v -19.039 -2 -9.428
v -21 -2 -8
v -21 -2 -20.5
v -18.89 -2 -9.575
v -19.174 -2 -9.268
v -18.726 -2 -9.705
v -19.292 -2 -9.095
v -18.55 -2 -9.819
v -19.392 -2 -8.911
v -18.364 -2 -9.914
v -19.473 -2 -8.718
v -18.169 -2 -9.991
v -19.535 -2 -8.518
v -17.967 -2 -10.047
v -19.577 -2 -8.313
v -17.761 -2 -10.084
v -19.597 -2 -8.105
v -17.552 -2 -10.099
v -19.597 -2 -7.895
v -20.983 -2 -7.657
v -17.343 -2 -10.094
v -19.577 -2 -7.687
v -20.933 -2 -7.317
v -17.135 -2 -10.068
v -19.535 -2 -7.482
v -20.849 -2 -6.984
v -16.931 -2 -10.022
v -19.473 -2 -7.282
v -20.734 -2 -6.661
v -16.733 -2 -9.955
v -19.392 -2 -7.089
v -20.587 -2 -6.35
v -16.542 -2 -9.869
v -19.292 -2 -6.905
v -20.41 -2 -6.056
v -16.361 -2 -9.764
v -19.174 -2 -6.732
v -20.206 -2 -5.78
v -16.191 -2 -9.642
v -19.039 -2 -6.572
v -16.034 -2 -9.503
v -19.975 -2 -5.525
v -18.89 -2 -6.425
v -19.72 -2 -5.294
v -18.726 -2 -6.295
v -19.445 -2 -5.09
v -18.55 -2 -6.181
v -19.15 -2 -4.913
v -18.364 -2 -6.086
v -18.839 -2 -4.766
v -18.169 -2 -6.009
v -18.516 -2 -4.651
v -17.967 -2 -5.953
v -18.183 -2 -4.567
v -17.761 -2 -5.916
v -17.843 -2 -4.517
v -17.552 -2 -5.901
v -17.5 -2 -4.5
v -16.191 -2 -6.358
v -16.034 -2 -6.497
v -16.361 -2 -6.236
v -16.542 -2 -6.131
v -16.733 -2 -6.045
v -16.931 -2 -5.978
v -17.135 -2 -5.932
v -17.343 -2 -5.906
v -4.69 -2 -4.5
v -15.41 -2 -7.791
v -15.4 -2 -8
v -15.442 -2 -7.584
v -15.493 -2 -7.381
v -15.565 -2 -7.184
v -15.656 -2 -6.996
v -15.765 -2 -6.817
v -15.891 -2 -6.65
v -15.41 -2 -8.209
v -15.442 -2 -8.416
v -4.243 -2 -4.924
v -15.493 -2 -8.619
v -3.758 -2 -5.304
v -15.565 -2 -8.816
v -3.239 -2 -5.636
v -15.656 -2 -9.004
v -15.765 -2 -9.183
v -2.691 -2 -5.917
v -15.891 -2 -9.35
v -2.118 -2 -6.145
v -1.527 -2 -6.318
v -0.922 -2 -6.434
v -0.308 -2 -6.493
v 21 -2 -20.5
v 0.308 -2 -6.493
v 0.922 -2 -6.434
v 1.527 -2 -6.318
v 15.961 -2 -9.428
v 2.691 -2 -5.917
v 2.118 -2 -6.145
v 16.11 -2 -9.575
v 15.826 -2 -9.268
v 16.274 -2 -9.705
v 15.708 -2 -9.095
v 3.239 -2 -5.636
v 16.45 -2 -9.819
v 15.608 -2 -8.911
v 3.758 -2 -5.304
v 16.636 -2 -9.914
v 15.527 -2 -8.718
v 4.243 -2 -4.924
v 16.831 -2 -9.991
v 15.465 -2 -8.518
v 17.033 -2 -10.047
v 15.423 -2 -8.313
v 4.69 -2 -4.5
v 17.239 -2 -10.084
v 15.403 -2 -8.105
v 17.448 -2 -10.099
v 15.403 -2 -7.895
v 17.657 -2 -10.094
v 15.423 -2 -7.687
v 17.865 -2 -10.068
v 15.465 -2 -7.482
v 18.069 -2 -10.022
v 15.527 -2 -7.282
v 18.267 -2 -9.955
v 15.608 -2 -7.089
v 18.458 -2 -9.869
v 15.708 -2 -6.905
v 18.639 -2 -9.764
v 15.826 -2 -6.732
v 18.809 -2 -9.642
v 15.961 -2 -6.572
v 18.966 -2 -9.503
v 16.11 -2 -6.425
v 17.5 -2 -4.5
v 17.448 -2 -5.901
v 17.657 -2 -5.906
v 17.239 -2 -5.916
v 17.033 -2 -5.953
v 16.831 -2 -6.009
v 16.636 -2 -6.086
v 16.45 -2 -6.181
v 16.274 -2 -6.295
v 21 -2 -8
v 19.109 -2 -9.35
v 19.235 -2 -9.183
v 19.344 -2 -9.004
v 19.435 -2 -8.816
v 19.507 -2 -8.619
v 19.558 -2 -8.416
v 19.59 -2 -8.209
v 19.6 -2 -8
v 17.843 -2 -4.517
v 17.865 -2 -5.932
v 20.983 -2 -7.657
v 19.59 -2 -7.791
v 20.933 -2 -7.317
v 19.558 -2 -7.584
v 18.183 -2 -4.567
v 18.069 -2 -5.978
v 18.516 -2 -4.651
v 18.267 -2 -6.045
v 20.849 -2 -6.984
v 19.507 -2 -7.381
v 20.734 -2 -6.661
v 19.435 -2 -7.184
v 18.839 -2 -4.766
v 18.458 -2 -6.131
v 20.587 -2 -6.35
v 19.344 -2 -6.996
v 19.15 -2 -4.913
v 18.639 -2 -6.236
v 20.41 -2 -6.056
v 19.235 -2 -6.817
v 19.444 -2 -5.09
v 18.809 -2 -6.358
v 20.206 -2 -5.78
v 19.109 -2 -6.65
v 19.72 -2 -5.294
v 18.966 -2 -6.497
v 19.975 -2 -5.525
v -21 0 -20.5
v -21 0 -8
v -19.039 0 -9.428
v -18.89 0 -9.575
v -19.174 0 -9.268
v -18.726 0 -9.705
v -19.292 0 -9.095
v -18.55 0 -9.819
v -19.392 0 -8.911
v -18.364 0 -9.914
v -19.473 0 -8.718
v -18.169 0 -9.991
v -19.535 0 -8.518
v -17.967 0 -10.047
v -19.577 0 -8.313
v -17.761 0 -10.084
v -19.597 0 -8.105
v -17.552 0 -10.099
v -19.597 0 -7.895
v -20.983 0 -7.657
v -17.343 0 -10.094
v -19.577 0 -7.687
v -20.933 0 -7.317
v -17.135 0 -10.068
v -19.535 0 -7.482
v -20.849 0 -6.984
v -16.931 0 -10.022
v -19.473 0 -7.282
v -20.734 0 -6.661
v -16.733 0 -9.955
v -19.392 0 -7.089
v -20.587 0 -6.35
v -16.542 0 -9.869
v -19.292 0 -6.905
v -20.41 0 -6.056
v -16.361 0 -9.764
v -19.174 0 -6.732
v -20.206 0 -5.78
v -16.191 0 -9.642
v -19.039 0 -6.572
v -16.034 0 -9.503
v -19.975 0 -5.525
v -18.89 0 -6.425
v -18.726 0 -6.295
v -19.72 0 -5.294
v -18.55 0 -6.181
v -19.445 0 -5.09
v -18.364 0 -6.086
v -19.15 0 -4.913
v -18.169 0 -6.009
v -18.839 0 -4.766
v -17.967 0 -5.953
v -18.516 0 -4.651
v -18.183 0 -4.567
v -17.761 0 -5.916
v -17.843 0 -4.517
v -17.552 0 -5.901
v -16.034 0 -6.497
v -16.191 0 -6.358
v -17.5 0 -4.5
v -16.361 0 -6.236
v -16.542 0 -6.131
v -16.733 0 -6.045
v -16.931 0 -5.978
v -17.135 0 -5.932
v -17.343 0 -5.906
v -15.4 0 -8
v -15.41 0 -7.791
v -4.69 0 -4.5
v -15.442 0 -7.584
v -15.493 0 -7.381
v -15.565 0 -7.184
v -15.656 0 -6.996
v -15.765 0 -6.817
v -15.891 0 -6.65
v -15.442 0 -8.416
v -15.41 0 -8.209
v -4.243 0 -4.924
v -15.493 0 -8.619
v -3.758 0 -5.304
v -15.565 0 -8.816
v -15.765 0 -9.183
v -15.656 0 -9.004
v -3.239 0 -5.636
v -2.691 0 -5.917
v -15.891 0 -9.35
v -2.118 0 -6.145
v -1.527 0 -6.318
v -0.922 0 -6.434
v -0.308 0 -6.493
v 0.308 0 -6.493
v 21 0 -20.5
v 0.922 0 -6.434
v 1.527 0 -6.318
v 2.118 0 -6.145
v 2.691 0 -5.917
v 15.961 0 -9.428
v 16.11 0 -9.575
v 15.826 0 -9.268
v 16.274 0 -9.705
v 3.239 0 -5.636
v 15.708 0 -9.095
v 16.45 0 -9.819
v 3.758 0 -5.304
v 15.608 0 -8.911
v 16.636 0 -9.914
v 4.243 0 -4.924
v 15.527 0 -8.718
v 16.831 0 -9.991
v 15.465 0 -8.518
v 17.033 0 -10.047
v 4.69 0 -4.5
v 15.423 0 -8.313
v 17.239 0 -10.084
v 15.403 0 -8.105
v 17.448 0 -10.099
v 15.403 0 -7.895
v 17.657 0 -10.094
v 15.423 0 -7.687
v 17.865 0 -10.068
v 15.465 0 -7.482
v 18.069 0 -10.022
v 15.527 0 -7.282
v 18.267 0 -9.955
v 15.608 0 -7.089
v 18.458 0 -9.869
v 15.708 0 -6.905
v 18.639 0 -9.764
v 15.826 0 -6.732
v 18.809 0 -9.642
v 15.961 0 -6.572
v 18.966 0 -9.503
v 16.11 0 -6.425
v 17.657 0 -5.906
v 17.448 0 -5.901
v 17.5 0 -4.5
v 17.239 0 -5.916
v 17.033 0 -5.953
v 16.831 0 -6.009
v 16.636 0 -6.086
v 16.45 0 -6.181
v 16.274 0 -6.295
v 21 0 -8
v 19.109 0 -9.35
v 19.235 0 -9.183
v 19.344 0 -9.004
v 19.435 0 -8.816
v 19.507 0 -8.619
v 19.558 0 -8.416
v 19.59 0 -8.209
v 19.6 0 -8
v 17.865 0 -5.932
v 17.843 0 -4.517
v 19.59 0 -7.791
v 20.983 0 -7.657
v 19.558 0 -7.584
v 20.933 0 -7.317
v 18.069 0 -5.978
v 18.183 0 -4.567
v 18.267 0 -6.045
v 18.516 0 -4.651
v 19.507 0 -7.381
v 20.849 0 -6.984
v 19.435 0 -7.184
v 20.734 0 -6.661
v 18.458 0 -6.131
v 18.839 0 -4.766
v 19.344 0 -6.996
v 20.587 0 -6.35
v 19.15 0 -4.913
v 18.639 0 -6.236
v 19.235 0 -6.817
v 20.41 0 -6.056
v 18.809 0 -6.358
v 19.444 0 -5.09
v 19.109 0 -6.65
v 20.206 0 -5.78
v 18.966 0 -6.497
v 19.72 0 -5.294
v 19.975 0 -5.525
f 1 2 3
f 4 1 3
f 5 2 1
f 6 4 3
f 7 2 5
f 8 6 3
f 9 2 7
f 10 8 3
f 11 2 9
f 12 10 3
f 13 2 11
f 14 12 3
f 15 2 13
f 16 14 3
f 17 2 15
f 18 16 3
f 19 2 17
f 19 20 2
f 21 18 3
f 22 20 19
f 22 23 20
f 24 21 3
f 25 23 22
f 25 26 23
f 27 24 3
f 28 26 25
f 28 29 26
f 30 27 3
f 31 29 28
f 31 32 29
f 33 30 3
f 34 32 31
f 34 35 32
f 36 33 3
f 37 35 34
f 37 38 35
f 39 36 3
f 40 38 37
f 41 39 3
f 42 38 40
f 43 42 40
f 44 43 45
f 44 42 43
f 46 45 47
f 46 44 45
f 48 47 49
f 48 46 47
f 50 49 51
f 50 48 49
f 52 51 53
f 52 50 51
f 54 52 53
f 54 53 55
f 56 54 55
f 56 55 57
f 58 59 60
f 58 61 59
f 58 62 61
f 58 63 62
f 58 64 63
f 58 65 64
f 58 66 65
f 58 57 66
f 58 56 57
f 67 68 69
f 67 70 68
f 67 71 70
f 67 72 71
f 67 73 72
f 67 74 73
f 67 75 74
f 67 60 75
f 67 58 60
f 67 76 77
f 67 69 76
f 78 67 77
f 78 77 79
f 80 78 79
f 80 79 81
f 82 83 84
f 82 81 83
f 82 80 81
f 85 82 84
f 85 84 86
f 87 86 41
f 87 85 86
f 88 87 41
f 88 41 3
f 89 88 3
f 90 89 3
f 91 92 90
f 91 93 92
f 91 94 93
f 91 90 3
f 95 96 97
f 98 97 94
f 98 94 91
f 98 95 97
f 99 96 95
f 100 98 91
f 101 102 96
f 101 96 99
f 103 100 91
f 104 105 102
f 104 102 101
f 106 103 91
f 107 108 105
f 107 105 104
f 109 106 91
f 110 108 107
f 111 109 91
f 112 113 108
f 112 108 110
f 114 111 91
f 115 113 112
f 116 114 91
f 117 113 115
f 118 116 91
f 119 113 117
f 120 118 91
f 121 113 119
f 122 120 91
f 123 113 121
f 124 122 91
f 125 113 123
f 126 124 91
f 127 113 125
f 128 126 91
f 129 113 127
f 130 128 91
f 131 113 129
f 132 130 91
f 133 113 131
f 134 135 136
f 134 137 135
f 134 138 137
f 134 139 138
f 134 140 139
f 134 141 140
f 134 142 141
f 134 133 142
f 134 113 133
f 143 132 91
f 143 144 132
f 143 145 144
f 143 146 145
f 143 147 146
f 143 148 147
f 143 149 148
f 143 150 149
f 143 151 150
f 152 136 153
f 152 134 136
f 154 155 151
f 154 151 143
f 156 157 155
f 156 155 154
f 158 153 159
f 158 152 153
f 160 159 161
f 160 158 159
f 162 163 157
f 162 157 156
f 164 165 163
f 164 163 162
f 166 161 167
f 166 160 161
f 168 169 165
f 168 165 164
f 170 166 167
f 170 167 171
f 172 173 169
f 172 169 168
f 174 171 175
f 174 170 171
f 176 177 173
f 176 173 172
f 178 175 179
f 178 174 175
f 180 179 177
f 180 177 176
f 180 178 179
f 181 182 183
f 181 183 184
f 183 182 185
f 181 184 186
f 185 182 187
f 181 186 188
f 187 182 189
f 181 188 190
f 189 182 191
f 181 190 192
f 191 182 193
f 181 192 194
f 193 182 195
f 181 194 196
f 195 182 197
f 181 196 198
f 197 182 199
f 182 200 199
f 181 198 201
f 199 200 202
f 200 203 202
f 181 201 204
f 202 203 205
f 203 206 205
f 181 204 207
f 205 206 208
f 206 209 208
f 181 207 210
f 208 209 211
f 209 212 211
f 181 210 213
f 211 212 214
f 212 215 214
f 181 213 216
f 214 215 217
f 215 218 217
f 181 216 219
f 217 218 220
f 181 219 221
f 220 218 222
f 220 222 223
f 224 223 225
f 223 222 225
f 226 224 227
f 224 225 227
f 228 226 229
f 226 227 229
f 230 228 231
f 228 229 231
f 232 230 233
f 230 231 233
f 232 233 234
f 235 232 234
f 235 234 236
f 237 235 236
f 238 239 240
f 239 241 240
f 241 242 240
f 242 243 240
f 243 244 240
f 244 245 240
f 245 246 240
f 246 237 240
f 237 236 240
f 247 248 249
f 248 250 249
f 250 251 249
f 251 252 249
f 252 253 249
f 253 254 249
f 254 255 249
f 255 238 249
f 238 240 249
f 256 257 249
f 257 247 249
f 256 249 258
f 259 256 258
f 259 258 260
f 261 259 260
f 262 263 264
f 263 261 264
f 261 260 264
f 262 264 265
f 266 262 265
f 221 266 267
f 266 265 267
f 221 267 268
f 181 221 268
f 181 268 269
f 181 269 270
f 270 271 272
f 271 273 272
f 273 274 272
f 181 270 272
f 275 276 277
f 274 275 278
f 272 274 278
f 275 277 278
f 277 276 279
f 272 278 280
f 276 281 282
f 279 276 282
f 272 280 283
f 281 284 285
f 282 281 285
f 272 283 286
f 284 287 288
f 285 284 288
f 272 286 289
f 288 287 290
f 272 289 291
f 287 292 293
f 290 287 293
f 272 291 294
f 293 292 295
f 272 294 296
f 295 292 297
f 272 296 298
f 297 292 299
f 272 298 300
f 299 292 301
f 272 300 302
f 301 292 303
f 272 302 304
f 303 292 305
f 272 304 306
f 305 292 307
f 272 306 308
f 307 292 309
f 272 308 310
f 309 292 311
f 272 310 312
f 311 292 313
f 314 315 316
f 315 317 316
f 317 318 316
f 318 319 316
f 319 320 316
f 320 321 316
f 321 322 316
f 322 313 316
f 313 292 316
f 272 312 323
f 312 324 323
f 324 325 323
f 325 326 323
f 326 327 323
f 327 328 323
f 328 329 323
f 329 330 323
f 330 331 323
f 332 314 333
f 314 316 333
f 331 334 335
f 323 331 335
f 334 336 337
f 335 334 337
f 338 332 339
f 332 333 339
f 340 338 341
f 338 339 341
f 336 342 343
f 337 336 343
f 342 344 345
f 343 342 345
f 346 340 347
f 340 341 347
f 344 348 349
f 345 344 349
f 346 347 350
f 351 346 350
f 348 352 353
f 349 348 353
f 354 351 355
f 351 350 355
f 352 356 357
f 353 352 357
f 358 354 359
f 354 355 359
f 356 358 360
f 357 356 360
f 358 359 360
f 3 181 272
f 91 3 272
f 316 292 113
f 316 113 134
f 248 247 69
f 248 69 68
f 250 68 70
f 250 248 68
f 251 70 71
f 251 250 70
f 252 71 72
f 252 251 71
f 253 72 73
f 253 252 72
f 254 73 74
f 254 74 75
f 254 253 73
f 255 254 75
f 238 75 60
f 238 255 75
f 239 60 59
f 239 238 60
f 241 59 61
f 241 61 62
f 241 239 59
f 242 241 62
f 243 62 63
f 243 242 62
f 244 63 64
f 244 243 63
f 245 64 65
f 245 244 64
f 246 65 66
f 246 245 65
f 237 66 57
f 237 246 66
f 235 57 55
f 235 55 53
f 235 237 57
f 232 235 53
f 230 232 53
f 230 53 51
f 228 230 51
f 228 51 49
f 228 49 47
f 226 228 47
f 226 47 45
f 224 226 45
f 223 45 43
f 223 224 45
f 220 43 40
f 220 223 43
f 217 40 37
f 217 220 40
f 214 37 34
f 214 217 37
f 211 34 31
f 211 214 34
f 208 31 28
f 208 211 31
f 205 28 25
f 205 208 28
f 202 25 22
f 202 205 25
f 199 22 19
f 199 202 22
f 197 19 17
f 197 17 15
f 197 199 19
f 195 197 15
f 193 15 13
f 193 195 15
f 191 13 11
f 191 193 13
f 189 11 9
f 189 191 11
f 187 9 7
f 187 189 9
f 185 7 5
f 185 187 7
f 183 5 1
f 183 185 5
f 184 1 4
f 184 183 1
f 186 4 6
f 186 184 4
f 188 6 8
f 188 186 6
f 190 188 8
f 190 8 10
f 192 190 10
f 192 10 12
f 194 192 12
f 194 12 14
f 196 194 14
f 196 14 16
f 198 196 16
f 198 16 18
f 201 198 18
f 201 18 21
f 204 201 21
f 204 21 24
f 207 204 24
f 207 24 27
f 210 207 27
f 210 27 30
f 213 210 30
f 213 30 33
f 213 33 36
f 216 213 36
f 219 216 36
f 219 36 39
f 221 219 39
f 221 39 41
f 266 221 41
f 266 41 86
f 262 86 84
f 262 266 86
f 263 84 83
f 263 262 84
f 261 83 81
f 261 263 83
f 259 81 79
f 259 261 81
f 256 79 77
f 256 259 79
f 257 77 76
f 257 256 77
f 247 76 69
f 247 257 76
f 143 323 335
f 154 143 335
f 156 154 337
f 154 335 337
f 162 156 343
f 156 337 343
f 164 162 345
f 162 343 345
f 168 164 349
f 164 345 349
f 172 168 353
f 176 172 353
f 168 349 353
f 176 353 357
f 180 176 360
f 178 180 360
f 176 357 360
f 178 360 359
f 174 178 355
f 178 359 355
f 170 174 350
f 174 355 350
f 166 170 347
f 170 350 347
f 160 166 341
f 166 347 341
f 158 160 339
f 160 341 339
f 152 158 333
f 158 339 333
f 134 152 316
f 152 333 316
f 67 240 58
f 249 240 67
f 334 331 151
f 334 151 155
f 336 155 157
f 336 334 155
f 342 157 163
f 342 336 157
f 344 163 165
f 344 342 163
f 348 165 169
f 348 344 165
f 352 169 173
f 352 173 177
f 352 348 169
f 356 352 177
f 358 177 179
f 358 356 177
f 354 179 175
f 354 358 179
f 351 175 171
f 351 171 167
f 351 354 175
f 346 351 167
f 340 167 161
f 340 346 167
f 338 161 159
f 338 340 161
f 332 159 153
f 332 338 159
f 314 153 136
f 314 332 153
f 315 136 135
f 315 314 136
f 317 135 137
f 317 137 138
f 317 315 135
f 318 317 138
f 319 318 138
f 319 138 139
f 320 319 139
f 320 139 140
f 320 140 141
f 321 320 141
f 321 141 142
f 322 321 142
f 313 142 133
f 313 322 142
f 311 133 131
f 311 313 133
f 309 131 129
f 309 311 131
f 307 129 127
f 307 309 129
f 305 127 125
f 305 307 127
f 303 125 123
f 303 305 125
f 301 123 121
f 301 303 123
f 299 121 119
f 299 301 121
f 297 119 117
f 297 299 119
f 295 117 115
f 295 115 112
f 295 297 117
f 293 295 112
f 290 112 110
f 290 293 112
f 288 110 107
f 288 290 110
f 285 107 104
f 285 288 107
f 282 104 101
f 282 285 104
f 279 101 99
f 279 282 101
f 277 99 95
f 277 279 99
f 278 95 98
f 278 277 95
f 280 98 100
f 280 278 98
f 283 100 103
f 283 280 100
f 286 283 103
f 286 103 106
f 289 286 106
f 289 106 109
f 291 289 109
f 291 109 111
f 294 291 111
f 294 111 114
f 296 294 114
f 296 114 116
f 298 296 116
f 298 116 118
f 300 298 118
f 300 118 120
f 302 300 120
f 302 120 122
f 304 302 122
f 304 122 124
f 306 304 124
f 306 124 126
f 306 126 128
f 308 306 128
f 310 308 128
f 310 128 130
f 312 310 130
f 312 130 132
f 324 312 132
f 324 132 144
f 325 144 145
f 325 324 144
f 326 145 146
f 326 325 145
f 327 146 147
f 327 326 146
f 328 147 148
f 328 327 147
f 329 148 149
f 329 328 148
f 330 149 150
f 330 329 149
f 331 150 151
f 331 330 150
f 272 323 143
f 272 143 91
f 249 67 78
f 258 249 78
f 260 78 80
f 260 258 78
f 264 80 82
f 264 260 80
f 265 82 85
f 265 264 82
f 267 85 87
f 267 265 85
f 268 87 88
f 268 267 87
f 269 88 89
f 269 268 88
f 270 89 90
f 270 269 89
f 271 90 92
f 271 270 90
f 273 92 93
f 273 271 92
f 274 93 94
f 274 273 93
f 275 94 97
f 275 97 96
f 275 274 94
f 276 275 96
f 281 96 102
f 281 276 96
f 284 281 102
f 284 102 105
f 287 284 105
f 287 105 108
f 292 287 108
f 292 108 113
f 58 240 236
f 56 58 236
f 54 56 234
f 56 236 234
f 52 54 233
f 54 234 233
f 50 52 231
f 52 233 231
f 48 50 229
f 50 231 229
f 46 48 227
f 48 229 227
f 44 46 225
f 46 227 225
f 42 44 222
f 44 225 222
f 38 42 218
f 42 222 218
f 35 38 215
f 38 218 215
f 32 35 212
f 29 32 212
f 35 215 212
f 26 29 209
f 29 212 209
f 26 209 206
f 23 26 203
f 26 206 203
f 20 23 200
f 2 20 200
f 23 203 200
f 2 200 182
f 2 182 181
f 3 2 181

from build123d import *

# Parameters (mm, degrees)
CYLINDER005_R     = 6.5
CYLINDER005_DEPTH = 2
SKETCH003_R       = 2.1
EXTRUDE004_DEPTH  = 2


with BuildPart() as motormountcutout:
    # Cylinder005 → Cylinder005 (new body)
    with BuildSketch(Plane(origin=(0, 0, 8), x_dir=(1, 0, 0), z_dir=(0, -1, 0))):
        Circle(CYLINDER005_R)
    extrude(amount=CYLINDER005_DEPTH)


with BuildPart() as motormount:
    # Sketch003 → Extrude004 (new body)
    with BuildSketch(Plane.XZ):
        with BuildLine():
            ThreePointArc((-17.500023, 3.5), (-19.97489, 2.474858), (-21, -2.3e-05))
            Line((-21, -2.3e-05), (-21, -12.500023))
            Line((-21, -12.500023), (21, -12.500023))
            Line((21, 0), (21, -12.500023))
            ThreePointArc((21, 0), (19.974874, 2.474874), (17.5, 3.5))
            Line((-17.500023, 3.5), (17.5, 3.5))
        make_face()
        with Locations((17.5, 0)):
            Circle(SKETCH003_R, mode=Mode.SUBTRACT)
        with Locations((-17.5, 0)):
            Circle(SKETCH003_R, mode=Mode.SUBTRACT)
    extrude(amount=EXTRUDE004_DEPTH)

    # Cut004: cut motorMountCutout
    add(motormountcutout.part, mode=Mode.SUBTRACT)


with BuildPart() as motormount_1:
    # Cut004 placement: moved
    add(motormount.part.moved(Location((0, 0, -8))))


solid = motormount_1.part
